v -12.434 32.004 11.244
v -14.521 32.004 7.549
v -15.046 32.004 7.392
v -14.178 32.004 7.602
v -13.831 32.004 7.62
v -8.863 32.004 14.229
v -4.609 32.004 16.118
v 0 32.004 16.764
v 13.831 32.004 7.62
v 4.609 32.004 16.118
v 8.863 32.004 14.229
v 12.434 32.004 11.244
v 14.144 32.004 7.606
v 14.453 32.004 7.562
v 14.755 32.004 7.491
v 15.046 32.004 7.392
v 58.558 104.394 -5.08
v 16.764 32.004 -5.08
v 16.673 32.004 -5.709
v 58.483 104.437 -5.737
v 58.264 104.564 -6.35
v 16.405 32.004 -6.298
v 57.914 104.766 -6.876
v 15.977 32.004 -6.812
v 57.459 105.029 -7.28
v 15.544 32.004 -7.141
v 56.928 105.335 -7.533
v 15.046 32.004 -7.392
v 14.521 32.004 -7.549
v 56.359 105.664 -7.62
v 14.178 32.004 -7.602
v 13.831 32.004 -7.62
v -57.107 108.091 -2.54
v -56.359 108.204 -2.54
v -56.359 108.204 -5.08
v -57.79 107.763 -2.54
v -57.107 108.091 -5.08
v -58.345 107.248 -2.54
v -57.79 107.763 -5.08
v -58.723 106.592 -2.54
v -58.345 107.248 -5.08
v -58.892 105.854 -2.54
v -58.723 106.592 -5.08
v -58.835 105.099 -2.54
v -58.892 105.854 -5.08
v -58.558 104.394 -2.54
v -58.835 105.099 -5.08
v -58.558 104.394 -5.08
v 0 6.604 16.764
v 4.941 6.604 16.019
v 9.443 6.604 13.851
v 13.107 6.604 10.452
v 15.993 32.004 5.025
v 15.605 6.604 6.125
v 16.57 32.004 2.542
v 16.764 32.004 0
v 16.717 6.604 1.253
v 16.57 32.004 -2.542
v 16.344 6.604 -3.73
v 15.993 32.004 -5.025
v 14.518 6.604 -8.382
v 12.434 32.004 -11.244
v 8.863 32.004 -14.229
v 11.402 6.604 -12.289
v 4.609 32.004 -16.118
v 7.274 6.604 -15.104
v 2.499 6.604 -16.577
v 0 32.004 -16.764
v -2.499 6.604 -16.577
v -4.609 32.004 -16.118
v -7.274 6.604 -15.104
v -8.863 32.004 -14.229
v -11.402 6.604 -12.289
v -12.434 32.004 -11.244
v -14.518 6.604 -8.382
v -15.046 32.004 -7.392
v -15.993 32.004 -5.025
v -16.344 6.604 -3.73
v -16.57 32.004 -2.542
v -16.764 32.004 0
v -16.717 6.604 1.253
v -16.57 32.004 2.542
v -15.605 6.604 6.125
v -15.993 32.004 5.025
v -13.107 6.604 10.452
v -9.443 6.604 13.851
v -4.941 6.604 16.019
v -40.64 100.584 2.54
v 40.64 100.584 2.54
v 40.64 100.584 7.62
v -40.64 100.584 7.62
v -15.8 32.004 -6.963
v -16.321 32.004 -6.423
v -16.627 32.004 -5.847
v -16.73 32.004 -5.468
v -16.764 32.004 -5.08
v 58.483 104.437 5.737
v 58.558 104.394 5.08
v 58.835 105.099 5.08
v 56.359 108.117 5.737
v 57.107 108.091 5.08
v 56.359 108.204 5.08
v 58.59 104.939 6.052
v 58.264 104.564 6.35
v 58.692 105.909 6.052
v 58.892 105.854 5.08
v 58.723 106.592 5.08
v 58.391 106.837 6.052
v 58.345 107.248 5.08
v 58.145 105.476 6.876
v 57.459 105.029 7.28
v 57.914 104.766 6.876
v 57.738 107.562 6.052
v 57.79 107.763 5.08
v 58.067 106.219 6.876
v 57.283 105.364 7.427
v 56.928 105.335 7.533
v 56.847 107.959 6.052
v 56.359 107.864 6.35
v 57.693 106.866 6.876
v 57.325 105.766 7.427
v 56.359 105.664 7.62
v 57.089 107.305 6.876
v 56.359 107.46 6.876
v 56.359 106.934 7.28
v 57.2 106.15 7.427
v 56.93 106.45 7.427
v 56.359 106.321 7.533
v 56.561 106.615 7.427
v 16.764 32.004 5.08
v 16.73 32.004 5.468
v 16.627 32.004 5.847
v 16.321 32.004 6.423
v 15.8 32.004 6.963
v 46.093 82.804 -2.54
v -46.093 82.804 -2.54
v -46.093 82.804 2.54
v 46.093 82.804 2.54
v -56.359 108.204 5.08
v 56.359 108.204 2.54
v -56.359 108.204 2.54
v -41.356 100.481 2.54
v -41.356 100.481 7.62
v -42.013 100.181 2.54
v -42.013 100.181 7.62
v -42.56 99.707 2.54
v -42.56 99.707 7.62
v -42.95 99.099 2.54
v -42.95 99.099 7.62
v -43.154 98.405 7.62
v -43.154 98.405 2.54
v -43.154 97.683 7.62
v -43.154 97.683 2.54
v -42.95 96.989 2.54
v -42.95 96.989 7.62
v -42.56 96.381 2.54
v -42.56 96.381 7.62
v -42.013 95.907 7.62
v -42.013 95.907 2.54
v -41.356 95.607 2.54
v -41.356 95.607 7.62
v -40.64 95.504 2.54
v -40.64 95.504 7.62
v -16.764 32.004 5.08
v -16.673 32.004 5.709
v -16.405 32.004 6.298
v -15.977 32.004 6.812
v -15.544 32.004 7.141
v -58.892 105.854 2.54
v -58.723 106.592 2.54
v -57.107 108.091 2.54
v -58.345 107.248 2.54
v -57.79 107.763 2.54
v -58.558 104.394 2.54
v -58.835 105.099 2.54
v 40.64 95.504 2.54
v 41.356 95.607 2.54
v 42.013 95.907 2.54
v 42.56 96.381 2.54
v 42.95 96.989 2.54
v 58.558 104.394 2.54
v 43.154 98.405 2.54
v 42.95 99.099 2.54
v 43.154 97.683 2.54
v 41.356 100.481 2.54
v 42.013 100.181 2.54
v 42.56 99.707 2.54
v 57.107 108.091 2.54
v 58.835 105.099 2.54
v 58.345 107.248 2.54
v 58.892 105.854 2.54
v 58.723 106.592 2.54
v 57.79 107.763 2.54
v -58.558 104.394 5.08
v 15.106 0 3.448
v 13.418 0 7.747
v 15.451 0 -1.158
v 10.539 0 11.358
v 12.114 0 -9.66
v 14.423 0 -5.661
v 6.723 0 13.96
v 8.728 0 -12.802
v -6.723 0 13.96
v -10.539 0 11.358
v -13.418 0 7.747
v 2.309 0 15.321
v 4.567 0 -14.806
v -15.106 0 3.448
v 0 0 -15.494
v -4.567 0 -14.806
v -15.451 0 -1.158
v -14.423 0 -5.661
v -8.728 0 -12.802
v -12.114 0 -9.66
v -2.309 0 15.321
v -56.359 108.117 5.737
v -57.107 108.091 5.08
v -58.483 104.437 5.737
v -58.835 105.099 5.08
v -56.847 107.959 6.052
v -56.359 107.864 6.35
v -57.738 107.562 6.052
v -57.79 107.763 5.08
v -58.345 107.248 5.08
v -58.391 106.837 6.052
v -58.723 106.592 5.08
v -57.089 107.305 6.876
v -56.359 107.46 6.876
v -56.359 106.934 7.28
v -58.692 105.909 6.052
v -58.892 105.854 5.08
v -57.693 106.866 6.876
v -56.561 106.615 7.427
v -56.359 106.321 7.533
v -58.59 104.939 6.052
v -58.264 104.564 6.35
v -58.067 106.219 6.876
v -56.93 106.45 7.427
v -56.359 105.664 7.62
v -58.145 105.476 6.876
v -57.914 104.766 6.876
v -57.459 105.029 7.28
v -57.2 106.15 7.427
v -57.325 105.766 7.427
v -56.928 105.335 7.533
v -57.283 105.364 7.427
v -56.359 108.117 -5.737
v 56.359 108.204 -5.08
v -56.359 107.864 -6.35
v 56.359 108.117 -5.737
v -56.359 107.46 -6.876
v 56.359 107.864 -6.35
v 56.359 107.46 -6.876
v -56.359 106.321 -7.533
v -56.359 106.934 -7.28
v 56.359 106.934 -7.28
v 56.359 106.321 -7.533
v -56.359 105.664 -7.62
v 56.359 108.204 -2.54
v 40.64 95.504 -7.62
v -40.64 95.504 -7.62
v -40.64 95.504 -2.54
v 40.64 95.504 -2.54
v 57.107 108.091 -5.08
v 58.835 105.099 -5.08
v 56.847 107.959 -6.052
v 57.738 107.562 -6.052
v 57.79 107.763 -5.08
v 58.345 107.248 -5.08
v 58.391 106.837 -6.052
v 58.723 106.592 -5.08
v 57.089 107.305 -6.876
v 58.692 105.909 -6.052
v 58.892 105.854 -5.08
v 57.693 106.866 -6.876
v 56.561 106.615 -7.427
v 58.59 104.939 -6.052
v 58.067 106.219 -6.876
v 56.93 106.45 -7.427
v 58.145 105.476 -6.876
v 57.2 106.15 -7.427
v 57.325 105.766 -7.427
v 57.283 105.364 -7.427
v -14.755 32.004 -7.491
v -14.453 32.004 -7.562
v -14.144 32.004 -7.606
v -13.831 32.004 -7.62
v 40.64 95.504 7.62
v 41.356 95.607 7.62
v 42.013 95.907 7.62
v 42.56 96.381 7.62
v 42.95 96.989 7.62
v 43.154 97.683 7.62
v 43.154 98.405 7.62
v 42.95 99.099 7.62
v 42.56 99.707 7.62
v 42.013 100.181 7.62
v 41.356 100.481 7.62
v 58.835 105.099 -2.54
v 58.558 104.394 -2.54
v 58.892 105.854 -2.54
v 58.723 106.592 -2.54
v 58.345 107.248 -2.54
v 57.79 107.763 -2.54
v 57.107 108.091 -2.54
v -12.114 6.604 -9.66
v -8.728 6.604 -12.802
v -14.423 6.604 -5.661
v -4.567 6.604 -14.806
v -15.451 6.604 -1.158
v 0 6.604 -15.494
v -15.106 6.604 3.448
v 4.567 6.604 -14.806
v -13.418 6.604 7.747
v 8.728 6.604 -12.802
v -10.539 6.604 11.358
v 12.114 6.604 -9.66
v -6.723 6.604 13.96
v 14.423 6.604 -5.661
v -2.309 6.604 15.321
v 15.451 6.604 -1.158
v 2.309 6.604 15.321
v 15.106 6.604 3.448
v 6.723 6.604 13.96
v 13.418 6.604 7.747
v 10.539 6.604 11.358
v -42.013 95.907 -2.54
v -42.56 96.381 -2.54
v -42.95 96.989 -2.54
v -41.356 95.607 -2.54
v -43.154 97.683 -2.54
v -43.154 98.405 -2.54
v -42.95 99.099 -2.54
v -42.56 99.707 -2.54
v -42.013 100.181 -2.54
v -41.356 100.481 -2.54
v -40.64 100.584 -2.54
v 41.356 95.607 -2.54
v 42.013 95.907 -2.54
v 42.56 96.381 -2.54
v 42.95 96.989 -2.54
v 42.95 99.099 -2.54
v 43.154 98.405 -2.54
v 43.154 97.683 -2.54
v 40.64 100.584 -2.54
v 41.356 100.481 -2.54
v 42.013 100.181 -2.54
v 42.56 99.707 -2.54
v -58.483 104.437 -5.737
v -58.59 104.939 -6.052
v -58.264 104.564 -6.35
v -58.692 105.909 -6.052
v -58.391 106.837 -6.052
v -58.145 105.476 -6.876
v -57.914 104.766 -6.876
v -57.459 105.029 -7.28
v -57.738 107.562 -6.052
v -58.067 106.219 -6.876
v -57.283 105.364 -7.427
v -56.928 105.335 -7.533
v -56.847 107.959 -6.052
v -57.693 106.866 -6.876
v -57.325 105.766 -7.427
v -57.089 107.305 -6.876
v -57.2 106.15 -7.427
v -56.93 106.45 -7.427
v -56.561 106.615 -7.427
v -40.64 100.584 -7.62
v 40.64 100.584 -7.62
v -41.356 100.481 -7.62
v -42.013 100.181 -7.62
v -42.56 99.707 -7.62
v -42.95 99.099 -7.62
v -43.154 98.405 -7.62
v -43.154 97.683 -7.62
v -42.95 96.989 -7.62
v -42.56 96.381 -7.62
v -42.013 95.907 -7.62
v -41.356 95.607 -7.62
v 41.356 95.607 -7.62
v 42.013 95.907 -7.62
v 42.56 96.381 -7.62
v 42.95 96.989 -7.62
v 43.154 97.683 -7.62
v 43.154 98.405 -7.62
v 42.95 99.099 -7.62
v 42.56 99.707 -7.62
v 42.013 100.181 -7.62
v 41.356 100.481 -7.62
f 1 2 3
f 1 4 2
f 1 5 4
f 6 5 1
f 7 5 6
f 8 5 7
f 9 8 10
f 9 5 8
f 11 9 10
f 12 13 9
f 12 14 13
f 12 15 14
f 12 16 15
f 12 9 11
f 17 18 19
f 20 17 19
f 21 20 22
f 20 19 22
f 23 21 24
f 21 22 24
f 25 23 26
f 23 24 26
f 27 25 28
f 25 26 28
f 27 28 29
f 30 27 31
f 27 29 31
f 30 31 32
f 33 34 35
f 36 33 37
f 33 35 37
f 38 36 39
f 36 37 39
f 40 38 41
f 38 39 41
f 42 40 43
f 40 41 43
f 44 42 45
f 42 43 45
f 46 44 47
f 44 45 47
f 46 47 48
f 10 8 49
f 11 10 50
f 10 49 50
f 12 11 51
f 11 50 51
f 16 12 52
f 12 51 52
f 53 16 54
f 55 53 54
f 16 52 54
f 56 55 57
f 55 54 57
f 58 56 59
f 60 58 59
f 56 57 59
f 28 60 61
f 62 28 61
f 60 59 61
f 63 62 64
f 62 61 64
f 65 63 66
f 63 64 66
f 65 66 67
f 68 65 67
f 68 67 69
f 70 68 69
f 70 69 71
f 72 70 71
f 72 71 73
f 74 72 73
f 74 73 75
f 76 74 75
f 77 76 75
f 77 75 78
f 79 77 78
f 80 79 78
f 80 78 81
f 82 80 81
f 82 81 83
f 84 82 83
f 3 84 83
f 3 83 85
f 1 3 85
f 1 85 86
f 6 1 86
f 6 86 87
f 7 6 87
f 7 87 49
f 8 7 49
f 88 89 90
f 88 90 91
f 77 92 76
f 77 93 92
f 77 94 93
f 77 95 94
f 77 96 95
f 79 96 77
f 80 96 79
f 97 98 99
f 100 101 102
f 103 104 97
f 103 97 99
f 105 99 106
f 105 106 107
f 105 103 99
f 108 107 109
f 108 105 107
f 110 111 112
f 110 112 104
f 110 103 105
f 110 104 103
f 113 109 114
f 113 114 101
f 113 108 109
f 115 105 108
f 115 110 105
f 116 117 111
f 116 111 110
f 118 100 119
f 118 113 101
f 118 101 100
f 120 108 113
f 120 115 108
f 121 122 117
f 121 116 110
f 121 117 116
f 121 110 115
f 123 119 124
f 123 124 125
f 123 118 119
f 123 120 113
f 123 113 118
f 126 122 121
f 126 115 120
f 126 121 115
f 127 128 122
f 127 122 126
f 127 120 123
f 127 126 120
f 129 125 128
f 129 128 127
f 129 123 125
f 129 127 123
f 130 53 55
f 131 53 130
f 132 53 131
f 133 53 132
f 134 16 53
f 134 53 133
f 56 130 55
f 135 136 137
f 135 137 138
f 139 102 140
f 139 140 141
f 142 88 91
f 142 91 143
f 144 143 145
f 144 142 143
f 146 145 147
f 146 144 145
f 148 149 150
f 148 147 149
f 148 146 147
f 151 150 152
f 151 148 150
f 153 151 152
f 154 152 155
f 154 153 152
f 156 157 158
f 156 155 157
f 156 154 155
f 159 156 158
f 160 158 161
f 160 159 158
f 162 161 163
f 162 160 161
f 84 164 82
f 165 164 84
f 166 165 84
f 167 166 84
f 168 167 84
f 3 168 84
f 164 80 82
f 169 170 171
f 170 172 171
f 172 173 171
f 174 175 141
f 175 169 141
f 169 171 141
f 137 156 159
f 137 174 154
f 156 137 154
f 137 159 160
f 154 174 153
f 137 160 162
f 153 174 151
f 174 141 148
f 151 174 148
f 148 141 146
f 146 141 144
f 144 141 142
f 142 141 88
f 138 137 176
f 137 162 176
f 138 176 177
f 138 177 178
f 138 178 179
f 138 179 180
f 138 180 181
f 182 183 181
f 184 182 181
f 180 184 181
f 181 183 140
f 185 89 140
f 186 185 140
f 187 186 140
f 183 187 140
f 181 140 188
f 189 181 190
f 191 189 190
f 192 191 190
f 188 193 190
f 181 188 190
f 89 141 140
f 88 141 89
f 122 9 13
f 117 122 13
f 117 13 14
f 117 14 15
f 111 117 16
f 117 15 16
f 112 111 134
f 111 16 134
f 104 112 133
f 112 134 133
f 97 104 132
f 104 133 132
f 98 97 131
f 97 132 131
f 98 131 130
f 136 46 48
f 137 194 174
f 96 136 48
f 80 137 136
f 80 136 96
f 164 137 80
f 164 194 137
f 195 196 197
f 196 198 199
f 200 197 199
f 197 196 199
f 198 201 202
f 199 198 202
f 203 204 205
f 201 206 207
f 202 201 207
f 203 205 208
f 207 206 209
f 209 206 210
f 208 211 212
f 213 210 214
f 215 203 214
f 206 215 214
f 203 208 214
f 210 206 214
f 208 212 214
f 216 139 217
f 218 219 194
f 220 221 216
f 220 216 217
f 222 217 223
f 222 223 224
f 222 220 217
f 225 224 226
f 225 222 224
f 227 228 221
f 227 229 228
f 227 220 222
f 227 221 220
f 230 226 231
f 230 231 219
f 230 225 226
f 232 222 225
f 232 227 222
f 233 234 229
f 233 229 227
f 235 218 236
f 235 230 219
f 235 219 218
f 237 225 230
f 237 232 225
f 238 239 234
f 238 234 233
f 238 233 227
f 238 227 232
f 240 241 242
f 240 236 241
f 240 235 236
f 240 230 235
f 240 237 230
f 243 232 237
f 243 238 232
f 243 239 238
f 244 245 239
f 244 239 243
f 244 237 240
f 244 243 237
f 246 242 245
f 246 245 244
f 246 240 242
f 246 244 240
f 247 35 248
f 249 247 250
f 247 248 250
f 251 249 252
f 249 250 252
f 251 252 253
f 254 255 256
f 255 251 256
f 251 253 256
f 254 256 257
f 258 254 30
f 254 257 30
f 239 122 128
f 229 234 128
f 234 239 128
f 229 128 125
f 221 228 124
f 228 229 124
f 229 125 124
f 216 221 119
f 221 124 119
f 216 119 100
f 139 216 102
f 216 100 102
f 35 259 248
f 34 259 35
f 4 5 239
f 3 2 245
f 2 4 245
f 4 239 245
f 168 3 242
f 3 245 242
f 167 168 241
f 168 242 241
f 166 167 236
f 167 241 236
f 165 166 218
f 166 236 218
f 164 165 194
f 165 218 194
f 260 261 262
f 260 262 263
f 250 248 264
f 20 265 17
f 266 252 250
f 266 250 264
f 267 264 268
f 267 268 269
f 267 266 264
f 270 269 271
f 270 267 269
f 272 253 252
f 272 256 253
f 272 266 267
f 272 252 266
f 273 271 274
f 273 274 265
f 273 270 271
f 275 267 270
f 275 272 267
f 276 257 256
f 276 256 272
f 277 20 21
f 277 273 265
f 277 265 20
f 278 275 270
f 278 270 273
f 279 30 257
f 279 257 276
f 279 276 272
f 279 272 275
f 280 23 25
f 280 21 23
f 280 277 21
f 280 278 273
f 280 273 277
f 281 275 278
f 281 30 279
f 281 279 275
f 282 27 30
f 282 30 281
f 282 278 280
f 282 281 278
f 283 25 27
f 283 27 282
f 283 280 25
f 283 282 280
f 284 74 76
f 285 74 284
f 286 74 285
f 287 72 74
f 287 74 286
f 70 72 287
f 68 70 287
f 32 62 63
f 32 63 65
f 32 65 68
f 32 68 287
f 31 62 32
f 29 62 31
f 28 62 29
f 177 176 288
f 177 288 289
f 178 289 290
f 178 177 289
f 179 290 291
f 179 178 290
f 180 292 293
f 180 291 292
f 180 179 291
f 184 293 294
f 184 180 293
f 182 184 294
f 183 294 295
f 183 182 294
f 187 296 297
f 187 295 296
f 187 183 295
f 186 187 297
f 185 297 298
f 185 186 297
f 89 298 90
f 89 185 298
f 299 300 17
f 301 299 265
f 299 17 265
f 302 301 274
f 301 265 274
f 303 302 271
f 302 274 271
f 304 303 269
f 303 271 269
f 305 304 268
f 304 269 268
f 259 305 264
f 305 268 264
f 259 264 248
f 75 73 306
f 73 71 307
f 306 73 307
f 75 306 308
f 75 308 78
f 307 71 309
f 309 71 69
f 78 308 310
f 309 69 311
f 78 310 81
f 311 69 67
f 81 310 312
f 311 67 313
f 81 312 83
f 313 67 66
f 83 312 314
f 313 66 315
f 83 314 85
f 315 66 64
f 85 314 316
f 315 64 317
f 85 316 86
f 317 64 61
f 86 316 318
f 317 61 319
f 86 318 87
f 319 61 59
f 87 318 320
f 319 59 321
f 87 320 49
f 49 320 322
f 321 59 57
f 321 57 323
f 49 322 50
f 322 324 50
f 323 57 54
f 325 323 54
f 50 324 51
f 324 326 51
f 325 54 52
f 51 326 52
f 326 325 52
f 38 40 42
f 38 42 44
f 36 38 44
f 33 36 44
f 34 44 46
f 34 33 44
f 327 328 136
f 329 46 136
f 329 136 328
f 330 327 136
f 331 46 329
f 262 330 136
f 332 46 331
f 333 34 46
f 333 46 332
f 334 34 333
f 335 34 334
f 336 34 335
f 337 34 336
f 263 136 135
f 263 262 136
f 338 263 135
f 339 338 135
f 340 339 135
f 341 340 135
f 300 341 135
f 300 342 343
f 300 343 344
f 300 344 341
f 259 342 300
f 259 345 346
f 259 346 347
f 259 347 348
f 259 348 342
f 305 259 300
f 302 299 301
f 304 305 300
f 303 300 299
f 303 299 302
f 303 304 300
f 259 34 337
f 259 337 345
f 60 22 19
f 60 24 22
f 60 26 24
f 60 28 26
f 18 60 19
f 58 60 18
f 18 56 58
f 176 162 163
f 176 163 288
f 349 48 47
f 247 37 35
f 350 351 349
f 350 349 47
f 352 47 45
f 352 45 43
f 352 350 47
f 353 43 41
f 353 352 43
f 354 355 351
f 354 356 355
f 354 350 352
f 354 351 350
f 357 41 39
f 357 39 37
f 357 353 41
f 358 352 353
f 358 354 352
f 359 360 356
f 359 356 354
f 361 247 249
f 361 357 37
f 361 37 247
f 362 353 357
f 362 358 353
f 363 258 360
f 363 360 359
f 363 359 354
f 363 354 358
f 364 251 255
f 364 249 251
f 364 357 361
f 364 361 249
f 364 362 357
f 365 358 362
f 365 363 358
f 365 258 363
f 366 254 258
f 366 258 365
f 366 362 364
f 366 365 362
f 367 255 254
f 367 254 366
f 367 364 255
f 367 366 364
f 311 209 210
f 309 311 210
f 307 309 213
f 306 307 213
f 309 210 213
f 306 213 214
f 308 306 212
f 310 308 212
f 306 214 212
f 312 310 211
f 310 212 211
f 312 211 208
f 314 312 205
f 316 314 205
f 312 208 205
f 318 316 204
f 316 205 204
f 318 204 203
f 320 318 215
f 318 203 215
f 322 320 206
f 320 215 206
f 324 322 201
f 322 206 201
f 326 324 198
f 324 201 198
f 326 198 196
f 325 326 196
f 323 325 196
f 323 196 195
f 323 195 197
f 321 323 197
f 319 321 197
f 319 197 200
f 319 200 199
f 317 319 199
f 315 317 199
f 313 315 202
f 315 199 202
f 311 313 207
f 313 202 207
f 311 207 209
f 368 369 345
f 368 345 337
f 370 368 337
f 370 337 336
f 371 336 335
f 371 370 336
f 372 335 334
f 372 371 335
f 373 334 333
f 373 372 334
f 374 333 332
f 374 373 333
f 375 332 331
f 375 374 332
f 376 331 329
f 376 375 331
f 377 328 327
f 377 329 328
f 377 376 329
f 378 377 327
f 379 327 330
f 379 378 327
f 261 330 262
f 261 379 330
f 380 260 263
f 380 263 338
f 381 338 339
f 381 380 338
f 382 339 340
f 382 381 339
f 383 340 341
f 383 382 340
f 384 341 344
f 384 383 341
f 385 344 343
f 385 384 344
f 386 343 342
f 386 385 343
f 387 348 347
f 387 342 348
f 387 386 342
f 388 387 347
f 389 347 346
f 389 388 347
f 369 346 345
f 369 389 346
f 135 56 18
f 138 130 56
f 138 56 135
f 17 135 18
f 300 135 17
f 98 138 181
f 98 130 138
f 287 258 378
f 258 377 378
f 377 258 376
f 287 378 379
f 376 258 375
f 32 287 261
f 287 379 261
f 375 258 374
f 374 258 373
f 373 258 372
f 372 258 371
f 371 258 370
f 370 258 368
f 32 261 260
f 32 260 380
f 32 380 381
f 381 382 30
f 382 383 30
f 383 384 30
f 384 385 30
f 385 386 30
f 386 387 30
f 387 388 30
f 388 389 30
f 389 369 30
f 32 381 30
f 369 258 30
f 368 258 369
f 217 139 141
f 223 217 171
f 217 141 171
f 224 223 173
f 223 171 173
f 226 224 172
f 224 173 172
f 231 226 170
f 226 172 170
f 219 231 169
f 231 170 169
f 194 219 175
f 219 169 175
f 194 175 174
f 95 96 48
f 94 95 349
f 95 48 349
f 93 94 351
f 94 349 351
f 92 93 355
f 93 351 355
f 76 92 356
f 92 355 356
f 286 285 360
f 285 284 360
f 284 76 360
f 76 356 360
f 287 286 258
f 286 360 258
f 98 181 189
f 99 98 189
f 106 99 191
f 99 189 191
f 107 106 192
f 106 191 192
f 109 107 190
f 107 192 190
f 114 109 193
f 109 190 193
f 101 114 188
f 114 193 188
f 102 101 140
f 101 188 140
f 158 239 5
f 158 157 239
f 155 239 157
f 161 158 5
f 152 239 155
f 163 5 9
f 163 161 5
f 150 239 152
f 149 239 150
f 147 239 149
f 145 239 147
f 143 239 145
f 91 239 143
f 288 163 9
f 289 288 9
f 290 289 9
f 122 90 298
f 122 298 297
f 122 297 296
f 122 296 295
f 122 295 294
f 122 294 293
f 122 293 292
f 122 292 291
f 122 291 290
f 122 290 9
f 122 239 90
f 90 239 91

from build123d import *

# Parameters (mm, degrees)
SKETCH1_R           = 15.494
BOSS_EXTRUDE1_DEPTH = 6.604
SKETCH2_R           = 16.764
BOSS_EXTRUDE2_DEPTH = 25.4
BOSS_EXTRUDE3_DEPTH = 7.62
FILLET1_R           = 2.54
SKETCH5_W           = 117.797362922
SKETCH5_H           = 5.08
CUT_EXTRUDE1_DEPTH  = 25.4
CUT_EXTRUDE2_DEPTH  = 25.4


with BuildPart() as part:
    # Sketch1 → Boss-Extrude1 (new body)
    with BuildSketch(Plane(origin=(0, 0, 0), x_dir=(1, 0, 0), z_dir=(0, 1, 0))):
        with Locations(Location((0, 0, 0), (0, 0, 90))):
            Circle(SKETCH1_R)
    extrude(amount=BOSS_EXTRUDE1_DEPTH)

    # Sketch2 → Boss-Extrude2 (add)
    with BuildSketch(Plane(origin=(0, 6.604, 0), x_dir=(1, 0, 0), z_dir=(0, 1, 0))):
        with Locations(Location((0, 0, 0), (0, 0, 270))):
            Circle(SKETCH2_R)
    extrude(amount=BOSS_EXTRUDE2_DEPTH)

    # Sketch4 → Boss-Extrude3 (add, symmetric)
    with BuildSketch(Plane.XY):
        Polygon((16.764, 32.004), (60.758090512, 108.204), (-60.758090512, 108.204), (-16.764, 32.004), align=None)
    extrude(amount=BOSS_EXTRUDE3_DEPTH, both=True)

    # Fillet1
    # the kernel refuses this fillet: 2.54 mm, written as the material it takes off along each edge
    with BuildSketch(Plane(origin=(56.358681461, 105.664, -5.08), x_dir=(0.8660254037844399, -0.49999999999999795, 0), z_dir=(0, 0, -1))) as fillet1_piece_1_section:
        Polygon((0, 0), (FILLET1_R, 0), (FILLET1_R, -FILLET1_R * 1.73205080757), (-FILLET1_R * 0.5, -FILLET1_R * 0.866025403784), align=None)
    fillet1_piece_1 = extrude(amount=FILLET1_R, mode=Mode.PRIVATE)
    fillet1_piece_1 = fillet1_piece_1 - Plane(origin=(56.358681461, 105.664, -5.08), x_dir=(-0.8660254037844382, -0.500000000000001, 0), z_dir=(0, 0, -1)) * Sphere(FILLET1_R, mode=Mode.PRIVATE)
    add(fillet1_piece_1, mode=Mode.SUBTRACT)
    with BuildSketch(Plane(origin=(-56.358681461, 105.664, -5.08), x_dir=(0, 1, 0), z_dir=(0, 0, -1))) as fillet1_piece_2_section:
        Polygon((0, 0), (FILLET1_R, 0), (FILLET1_R, -FILLET1_R * 1.73205080757), (-FILLET1_R * 0.5, -FILLET1_R * 0.866025403784), align=None)
    fillet1_piece_2 = extrude(amount=FILLET1_R, mode=Mode.PRIVATE)
    fillet1_piece_2 = fillet1_piece_2 - Plane(origin=(-56.358681461, 105.664, -5.08), x_dir=(0.8660254037844382, -0.500000000000001, 0), z_dir=(0, 0, -1)) * Sphere(FILLET1_R, mode=Mode.PRIVATE)
    add(fillet1_piece_2, mode=Mode.SUBTRACT)
    with BuildSketch(Plane(origin=(56.358681461, 105.664, 5.08), x_dir=(0.8660254037844399, -0.49999999999999795, 0), z_dir=(0, 0, 1))) as fillet1_piece_3_section:
        Polygon((0, 0), (FILLET1_R, 0), (FILLET1_R, FILLET1_R * 1.73205080757), (-FILLET1_R * 0.5, FILLET1_R * 0.866025403784), align=None)
    fillet1_piece_3 = extrude(amount=FILLET1_R, mode=Mode.PRIVATE)
    fillet1_piece_3 = fillet1_piece_3 - Plane(origin=(56.358681461, 105.664, 5.08), x_dir=(-0.8660254037844382, -0.500000000000001, 0), z_dir=(0, 0, 1)) * Sphere(FILLET1_R, mode=Mode.PRIVATE)
    add(fillet1_piece_3, mode=Mode.SUBTRACT)
    with BuildSketch(Plane(origin=(-56.358681461, 105.664, 5.08), x_dir=(-0.8660254037844399, -0.49999999999999795, 0), z_dir=(0, 0, 1))) as fillet1_piece_4_section:
        Polygon((0, 0), (FILLET1_R, 0), (FILLET1_R, -FILLET1_R * 1.73205080757), (-FILLET1_R * 0.5, -FILLET1_R * 0.866025403784), align=None)
    fillet1_piece_4 = extrude(amount=FILLET1_R, mode=Mode.PRIVATE)
    fillet1_piece_4 = fillet1_piece_4 - Plane(origin=(-56.358681461, 105.664, 5.08), x_dir=(0.8660254037844382, -0.500000000000001, 0), z_dir=(0, 0, 1)) * Sphere(FILLET1_R, mode=Mode.PRIVATE)
    add(fillet1_piece_4, mode=Mode.SUBTRACT)
    with BuildSketch(Plane(origin=(13.589, 26.504738686, -7.62), x_dir=(-0.8660254037844398, 0.499999999999998, 0), z_dir=(0.49999999999999795, 0.8660254037844399, 0))) as fillet1_piece_5_section:
        with BuildLine():
            CenterArc((FILLET1_R, FILLET1_R), FILLET1_R, 180, 90)
            Line((0, FILLET1_R), (0, 0))
            Line((0, 0), (FILLET1_R, 0))
        make_face()
    fillet1_piece_5 = extrude(amount=89.938771973, mode=Mode.PRIVATE)
    fillet1_piece_5 = split(fillet1_piece_5, bisect_by=Plane(origin=(37.078105995, 32.004, -7.046175079), z_dir=(0, 1, 0)), keep=Keep.TOP, mode=Mode.PRIVATE)
    add(fillet1_piece_5, mode=Mode.SUBTRACT)
    with BuildSketch(Plane(origin=(56.358681461, 108.204, -7.62), x_dir=(0, -1, 0), z_dir=(-1, 0, 0))) as fillet1_piece_6:
        with BuildLine():
            CenterArc((FILLET1_R, FILLET1_R), FILLET1_R, 180, 90)
            Line((0, FILLET1_R), (0, 0))
            Line((0, 0), (FILLET1_R, 0))
        make_face()
    extrude(amount=112.717362922, mode=Mode.SUBTRACT)
    with BuildSketch(Plane(origin=(60.758090512, 108.204, -5.08), x_dir=(-0.49999999999999645, -0.8660254037844407, 0), z_dir=(0, 0, 1))) as fillet1_piece_7:
        with BuildLine():
            CenterArc((FILLET1_R * 1.73205080757, -FILLET1_R), FILLET1_R, 90, 120)
            Line((FILLET1_R * 0.866025403784, -FILLET1_R * 1.5), (0, 0))
            Line((0, 0), (FILLET1_R * 1.73205080757, 0))
        make_face()
    extrude(amount=10.16, mode=Mode.SUBTRACT)
    with BuildSketch(Plane(origin=(-58.558385987, 104.394, -7.62), x_dir=(0, 0, 1), z_dir=(0.49999999999999795, -0.8660254037844399, 0))) as fillet1_piece_8_section:
        with BuildLine():
            CenterArc((FILLET1_R, -FILLET1_R), FILLET1_R, 90, 90)
            Line((0, -FILLET1_R), (0, 0))
            Line((0, 0), (FILLET1_R, 0))
        make_face()
    fillet1_piece_8 = extrude(amount=89.938771973, mode=Mode.PRIVATE)
    fillet1_piece_8 = split(fillet1_piece_8, bisect_by=Plane(origin=(-37.078105995, 32.004, -7.046175079), z_dir=(0, 1, 0)), keep=Keep.TOP, mode=Mode.PRIVATE)
    add(fillet1_piece_8, mode=Mode.SUBTRACT)
    with BuildSketch(Plane(origin=(-60.758090512, 108.204, -5.08), x_dir=(0.4999999999999989, -0.8660254037844393, 0), z_dir=(0, 0, 1))) as fillet1_piece_9:
        with BuildLine():
            CenterArc((FILLET1_R * 1.73205080757, FILLET1_R), FILLET1_R, 150, 120)
            Line((FILLET1_R * 0.866025403784, FILLET1_R * 1.5), (0, 0))
            Line((0, 0), (FILLET1_R * 1.73205080757, 0))
        make_face()
    extrude(amount=10.16, mode=Mode.SUBTRACT)
    with BuildSketch(Plane(origin=(13.589, 26.504738686, 7.62), x_dir=(-0.8660254037844398, 0.499999999999998, 0), z_dir=(0.49999999999999795, 0.8660254037844399, 0))) as fillet1_piece_10_section:
        with BuildLine():
            CenterArc((FILLET1_R, -FILLET1_R), FILLET1_R, 90, 90)
            Line((0, -FILLET1_R), (0, 0))
            Line((0, 0), (FILLET1_R, 0))
        make_face()
    fillet1_piece_10 = extrude(amount=89.938771973, mode=Mode.PRIVATE)
    fillet1_piece_10 = split(fillet1_piece_10, bisect_by=Plane(origin=(37.078105995, 32.004, 7.046175079), z_dir=(0, 1, 0)), keep=Keep.TOP, mode=Mode.PRIVATE)
    add(fillet1_piece_10, mode=Mode.SUBTRACT)
    with BuildSketch(Plane(origin=(56.358681461, 108.204, 7.62), x_dir=(0, -1, 0), z_dir=(-1, 0, 0))) as fillet1_piece_11:
        with BuildLine():
            CenterArc((FILLET1_R, -FILLET1_R), FILLET1_R, 90, 90)
            Line((0, -FILLET1_R), (0, 0))
            Line((0, 0), (FILLET1_R, 0))
        make_face()
    extrude(amount=112.717362922, mode=Mode.SUBTRACT)
    with BuildSketch(Plane(origin=(-58.558385987, 104.394, 7.62), x_dir=(0.8660254037844399, 0.499999999999998, 0), z_dir=(0.49999999999999795, -0.8660254037844399, 0))) as fillet1_piece_12_section:
        with BuildLine():
            CenterArc((FILLET1_R, -FILLET1_R), FILLET1_R, 90, 90)
            Line((0, -FILLET1_R), (0, 0))
            Line((0, 0), (FILLET1_R, 0))
        make_face()
    fillet1_piece_12 = extrude(amount=89.938771973, mode=Mode.PRIVATE)
    fillet1_piece_12 = split(fillet1_piece_12, bisect_by=Plane(origin=(-37.078105995, 32.004, 7.046175079), z_dir=(0, 1, 0)), keep=Keep.TOP, mode=Mode.PRIVATE)
    add(fillet1_piece_12, mode=Mode.SUBTRACT)

    # Sketch5 → Cut-Extrude1 (cut)
    with BuildSketch(Plane(origin=(0, 108.204, 0), x_dir=(1, 0, 0), z_dir=(0, 1, 0))):
        Rectangle(SKETCH5_W, SKETCH5_H)
    extrude(amount=-CUT_EXTRUDE1_DEPTH, mode=Mode.SUBTRACT)

    # Sketch6 → Cut-Extrude2 (cut)
    with BuildSketch(Plane(origin=(0, 0, -7.62), x_dir=(-1, 0, 0), z_dir=(0, 0, -1))):
        with BuildLine():
            Line((-40.64, 100.584), (40.64, 100.584))
            ThreePointArc((40.64, 100.584), (43.18, 98.044), (40.64, 95.504))
            Line((40.64, 95.504), (-40.64, 95.504))
            ThreePointArc((-40.64, 95.504), (-43.18, 98.044), (-40.64, 100.584))
        make_face()
    extrude(amount=-CUT_EXTRUDE2_DEPTH, mode=Mode.SUBTRACT)


solid = part.part
